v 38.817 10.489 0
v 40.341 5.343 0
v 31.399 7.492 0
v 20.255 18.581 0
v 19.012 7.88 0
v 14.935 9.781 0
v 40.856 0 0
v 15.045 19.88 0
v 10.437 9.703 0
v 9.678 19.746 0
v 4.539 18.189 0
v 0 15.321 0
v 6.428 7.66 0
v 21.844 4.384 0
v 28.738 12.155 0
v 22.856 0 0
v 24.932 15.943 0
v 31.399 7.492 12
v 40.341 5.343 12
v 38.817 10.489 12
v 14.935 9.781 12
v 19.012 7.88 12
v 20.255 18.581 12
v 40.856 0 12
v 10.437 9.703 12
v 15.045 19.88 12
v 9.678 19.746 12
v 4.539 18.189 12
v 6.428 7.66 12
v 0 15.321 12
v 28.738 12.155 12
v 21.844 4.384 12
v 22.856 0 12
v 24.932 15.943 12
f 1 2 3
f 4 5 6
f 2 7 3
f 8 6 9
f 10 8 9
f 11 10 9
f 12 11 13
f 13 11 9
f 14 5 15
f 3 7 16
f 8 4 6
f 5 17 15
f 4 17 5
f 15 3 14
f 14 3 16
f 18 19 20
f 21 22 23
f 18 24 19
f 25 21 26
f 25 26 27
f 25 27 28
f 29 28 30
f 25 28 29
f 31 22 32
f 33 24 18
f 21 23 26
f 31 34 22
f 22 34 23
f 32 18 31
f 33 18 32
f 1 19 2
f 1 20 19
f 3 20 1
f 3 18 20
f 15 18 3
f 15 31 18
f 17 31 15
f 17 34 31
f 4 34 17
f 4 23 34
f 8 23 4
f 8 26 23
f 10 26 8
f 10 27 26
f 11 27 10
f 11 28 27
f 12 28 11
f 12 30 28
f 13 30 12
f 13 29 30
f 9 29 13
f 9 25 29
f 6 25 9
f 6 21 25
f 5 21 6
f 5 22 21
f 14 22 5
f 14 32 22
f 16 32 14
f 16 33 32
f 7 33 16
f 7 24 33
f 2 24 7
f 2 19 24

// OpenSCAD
$fn = 32;

// ----------------------------------------------------------------------
// Arc stop: segment, 12 mm thick
// ----------------------------------------------------------------------

// --- parameters (mm) ---
profile_height = 12;      // extrusion height
profile_points = 17;      // points of the closed outline

profile = [[40.856, 0], [40.341, 5.343], [38.817, 10.489], [31.399, 7.492], [28.738, 12.155], [24.932, 15.943], [20.255, 18.581], [15.045, 19.88], [9.678, 19.746], [4.539, 18.189], [0, 15.321], [6.428, 7.66], [10.437, 9.703], [14.935, 9.781], [19.012, 7.88], [21.844, 4.384], [22.856, 0]];  // single closed polygon, 17 points, counter clockwise

// --- the one profile operation ---
linear_extrude(height = profile_height) polygon(points = profile);
